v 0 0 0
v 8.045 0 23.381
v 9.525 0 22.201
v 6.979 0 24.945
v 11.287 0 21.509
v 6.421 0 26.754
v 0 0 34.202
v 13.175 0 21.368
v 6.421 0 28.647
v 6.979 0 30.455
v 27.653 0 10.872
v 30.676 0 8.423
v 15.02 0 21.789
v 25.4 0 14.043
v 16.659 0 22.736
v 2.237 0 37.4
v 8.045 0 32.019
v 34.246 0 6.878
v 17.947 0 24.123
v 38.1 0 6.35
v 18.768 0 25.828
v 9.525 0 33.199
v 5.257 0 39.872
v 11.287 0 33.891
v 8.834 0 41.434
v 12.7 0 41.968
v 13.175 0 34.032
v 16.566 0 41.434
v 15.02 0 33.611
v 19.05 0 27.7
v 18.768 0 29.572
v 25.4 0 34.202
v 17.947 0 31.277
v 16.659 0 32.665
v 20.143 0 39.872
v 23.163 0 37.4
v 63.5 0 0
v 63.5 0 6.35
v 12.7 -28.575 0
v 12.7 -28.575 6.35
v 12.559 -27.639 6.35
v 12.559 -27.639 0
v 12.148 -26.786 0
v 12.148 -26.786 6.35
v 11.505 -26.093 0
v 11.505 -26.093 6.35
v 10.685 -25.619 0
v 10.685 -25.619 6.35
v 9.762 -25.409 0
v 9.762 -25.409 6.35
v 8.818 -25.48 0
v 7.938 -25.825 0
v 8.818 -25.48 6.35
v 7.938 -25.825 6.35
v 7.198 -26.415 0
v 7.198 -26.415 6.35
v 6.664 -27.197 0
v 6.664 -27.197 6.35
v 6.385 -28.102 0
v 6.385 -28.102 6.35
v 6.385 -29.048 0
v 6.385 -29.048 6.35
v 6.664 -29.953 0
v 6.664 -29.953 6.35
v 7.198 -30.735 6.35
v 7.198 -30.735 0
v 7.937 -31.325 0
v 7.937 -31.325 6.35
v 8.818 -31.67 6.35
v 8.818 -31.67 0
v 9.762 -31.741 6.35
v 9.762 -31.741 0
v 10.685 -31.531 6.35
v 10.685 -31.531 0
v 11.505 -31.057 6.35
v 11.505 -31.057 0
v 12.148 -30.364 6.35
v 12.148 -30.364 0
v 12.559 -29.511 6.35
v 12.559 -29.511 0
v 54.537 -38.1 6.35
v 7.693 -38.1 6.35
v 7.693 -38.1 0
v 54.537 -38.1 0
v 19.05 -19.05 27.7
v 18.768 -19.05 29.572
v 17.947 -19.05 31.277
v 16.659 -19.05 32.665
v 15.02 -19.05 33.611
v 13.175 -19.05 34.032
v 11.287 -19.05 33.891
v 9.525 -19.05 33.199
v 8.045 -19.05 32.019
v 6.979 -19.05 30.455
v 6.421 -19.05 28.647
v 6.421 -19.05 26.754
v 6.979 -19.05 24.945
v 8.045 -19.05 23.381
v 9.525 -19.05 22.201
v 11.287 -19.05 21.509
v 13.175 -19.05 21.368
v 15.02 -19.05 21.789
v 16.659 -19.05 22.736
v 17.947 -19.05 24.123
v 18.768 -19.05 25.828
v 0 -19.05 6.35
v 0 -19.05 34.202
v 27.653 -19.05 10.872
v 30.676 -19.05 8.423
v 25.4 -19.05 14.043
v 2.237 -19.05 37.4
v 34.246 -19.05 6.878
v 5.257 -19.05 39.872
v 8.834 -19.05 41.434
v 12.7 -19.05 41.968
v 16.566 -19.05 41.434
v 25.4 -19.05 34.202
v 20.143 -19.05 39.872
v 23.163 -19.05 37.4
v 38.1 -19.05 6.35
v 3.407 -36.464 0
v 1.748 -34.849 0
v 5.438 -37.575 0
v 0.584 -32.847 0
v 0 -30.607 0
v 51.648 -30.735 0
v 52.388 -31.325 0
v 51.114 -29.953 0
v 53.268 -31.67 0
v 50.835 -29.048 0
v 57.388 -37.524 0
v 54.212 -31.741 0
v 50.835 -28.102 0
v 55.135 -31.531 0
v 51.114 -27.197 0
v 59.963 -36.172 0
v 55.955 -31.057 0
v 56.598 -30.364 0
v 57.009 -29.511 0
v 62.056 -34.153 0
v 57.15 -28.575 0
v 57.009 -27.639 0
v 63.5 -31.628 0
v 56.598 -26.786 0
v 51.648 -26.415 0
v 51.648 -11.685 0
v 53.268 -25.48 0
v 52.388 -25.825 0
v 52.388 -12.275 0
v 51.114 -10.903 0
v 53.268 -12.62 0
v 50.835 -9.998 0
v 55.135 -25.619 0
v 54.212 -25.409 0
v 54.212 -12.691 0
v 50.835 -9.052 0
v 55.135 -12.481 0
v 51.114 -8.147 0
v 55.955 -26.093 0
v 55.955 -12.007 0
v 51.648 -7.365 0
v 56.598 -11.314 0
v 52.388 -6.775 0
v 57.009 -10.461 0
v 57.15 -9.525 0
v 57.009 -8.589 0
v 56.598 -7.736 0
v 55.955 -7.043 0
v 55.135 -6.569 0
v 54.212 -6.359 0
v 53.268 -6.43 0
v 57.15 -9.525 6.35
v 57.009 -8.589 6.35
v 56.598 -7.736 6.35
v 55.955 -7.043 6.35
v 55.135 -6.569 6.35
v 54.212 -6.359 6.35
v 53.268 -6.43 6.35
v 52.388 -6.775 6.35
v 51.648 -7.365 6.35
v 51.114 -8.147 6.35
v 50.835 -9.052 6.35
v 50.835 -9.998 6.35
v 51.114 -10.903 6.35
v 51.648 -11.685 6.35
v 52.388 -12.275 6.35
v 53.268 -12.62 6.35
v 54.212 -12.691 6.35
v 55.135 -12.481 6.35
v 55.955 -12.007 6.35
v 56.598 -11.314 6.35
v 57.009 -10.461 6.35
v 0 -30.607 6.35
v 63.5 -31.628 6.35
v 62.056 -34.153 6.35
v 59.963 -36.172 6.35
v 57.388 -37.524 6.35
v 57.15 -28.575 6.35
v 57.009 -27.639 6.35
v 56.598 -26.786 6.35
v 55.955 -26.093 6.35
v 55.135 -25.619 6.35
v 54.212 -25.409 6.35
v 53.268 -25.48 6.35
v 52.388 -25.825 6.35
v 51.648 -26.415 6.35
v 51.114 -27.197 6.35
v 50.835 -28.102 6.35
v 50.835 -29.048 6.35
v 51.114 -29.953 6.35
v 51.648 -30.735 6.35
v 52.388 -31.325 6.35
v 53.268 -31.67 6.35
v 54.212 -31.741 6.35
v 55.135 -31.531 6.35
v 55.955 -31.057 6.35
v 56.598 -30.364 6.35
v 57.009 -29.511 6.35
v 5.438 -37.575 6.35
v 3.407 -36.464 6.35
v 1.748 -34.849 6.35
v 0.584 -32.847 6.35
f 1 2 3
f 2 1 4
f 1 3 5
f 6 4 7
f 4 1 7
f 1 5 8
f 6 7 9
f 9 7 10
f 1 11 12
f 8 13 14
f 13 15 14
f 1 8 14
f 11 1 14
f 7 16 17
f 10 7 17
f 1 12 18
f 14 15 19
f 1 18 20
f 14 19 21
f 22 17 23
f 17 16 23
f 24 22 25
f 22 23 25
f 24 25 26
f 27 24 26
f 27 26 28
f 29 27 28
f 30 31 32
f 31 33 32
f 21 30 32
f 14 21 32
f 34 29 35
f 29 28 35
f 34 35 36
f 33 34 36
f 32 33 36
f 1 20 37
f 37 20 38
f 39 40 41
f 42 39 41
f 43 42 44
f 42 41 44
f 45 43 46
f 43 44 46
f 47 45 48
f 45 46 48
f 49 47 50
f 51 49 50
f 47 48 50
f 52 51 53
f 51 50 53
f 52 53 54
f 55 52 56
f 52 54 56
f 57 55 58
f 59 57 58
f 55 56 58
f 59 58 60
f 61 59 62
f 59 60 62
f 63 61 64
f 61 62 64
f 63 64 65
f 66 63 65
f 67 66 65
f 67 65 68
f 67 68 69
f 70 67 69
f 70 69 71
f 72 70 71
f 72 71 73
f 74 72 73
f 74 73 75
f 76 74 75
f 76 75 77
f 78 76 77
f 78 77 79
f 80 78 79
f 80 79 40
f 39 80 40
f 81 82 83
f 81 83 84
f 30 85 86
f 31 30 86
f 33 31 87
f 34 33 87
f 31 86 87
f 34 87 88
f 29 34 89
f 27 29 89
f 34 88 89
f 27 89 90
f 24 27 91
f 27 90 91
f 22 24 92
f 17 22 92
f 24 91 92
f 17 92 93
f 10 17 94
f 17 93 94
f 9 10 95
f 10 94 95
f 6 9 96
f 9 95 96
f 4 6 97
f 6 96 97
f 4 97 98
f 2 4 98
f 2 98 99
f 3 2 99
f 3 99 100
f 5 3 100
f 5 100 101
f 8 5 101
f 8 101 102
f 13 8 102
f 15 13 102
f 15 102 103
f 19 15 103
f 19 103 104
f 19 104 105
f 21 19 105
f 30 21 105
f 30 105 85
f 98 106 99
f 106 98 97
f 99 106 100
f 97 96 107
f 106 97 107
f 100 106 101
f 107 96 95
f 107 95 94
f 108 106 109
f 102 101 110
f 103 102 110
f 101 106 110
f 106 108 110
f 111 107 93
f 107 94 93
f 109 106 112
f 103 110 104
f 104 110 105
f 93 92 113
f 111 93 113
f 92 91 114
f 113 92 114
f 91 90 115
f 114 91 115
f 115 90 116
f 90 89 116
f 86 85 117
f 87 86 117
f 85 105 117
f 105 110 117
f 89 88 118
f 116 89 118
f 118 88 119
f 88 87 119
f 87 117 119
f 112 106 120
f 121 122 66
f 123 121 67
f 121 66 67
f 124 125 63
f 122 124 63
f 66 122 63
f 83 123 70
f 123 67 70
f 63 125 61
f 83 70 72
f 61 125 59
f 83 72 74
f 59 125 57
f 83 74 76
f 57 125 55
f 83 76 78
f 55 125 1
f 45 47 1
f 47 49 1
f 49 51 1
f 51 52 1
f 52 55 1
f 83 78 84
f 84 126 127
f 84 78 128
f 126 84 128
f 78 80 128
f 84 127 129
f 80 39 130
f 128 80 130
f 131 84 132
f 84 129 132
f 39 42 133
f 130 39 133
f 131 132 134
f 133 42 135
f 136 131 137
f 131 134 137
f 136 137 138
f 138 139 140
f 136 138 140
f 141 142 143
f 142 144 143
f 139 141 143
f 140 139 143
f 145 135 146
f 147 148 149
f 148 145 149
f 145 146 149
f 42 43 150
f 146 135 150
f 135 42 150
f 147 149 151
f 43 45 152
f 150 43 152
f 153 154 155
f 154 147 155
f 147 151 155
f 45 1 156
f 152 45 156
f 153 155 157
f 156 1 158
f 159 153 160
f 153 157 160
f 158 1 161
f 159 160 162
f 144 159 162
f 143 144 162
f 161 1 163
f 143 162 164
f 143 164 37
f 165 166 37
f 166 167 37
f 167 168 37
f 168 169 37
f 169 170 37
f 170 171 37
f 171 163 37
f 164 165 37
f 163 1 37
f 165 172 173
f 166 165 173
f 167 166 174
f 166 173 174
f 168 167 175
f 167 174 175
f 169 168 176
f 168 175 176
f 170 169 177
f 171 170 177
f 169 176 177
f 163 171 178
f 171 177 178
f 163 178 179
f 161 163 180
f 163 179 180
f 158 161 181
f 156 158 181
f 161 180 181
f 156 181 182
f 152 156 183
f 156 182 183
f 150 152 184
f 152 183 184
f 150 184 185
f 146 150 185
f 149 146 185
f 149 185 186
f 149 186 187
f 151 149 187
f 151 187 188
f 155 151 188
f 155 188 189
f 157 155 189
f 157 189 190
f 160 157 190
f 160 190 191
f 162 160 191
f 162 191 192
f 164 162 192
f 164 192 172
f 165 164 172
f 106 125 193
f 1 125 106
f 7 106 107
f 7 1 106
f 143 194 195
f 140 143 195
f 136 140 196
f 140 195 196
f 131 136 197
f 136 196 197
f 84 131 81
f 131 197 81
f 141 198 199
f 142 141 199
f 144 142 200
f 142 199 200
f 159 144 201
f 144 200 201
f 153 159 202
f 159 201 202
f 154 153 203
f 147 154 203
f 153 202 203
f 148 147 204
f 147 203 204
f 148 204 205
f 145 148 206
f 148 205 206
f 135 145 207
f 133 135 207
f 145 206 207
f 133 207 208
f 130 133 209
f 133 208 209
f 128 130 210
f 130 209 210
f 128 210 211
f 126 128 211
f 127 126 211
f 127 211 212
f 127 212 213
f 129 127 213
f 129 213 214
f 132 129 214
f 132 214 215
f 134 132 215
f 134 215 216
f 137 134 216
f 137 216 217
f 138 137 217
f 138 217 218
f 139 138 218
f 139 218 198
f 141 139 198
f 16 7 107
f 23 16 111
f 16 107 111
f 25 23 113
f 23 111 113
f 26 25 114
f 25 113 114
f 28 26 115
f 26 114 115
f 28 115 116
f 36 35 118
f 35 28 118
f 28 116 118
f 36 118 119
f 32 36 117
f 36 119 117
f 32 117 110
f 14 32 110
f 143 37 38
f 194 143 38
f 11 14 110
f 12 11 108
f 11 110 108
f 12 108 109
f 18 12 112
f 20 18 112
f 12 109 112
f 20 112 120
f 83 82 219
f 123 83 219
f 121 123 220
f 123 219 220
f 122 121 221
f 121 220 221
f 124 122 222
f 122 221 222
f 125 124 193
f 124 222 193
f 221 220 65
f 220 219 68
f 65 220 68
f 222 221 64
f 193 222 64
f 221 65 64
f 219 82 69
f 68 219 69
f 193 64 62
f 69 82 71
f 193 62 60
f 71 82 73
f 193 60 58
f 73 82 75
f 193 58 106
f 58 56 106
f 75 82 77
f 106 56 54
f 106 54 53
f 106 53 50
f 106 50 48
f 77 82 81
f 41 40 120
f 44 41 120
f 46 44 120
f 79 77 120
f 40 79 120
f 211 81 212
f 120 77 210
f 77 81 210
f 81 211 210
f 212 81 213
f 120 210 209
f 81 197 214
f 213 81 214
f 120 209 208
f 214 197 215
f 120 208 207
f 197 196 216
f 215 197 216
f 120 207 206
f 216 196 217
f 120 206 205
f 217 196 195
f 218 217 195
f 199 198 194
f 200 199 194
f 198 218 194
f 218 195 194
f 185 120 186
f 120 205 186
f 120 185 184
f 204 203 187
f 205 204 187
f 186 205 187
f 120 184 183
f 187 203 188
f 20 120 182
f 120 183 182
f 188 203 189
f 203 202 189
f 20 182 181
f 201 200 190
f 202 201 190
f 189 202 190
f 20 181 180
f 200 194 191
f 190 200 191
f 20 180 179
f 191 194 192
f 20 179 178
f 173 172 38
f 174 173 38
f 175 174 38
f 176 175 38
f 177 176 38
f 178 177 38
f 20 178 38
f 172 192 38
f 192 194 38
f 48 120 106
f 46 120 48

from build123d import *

# Parameters (mm, degrees)
F0_W      = 63.5
F0_H      = 44.45
F1_DEPTH  = 38.1
F2_W      = 25.4
F2_H      = 38.1
F3_DEPTH  = 38.1
F4_W      = 19.05
F4_H      = 38.1
F5_DEPTH  = 38.1
F6_R      = 3.175
F7_DEPTH  = 25.4
F9_DEPTH  = 25.4
F11_DEPTH = 25.4
F12_R     = 6.35
F13_DEPTH = 25.4


with BuildPart() as f1:
    # F0 (on Front) → F1 (new body)
    with BuildSketch(Plane.XZ):
        with Locations((31.75, 22.225)):
            Rectangle(F0_W, F0_H)
    extrude(amount=F1_DEPTH)

    # F2 (on face) → F3 (cut)
    with BuildSketch(Plane.XZ.offset(38.1)):
        with Locations((50.8, 25.4)):
            Rectangle(F2_W, F2_H)
    extrude(amount=-F3_DEPTH, mode=Mode.SUBTRACT)

    # F4 (on face) → F5 (cut)
    with BuildSketch(Plane.YZ.offset(38.1)):
        with Locations((-28.575, 25.4)):
            Rectangle(F4_W, F4_H)
    extrude(amount=-F5_DEPTH, mode=Mode.SUBTRACT)

    # F6 (on face) → F7 (cut)
    with BuildSketch(Plane.XY.offset(6.35)):
        with Locations((53.975, -9.525)):
            Circle(F6_R)
        with Locations((53.975, -28.575)):
            Circle(F6_R)
        with Locations((9.525, -28.575)):
            Circle(F6_R)
    extrude(amount=-F7_DEPTH, mode=Mode.SUBTRACT)

    # F8 (on face) → F9 (cut)
    with BuildSketch(Plane.XY.offset(6.35)):
        with BuildLine():
            ThreePointArc((7.6932702214, -38.1), (2.5225699869, -35.7128573059), (0, -30.6068577154))
            Line((0, -30.6068577154), (0, -38.1))
            Line((0, -38.1), (7.6932702214, -38.1))
        make_face()
        with BuildLine():
            ThreePointArc((63.5, -31.6278859973), (59.9629765941, -36.172141291), (54.536730051, -38.1))
            Line((54.536730051, -38.1), (63.5, -38.1))
            Line((63.5, -38.1), (63.5, -31.6278859973))
        make_face()
    extrude(amount=-F9_DEPTH, mode=Mode.SUBTRACT)

    # F10 (on face) → F11 (cut)
    with BuildSketch(Plane.XZ.offset(19.05)):
        with BuildLine():
            ThreePointArc((0, 34.2015661299), (12.7, 41.9675576974), (25.4, 34.2015661299))
            Line((25.4, 34.2015661299), (25.4, 14.0428527725))
            ThreePointArc((25.4, 14.0428527725), (30.6758841641, 8.4231867937), (38.1, 6.35))
            Line((38.1, 6.35), (38.1, 44.45))
            Line((38.1, 44.45), (0, 44.45))
            Line((0, 44.45), (0, 34.2015661299))
        make_face()
    extrude(amount=-F11_DEPTH, mode=Mode.SUBTRACT)

    # F12 (on face) → F13 (cut)
    with BuildSketch(Plane.XZ.offset(19.05)):
        with Locations((12.7, 27.7001828811)):
            Circle(F12_R)
    extrude(amount=-F13_DEPTH, mode=Mode.SUBTRACT)


solid = f1.part
